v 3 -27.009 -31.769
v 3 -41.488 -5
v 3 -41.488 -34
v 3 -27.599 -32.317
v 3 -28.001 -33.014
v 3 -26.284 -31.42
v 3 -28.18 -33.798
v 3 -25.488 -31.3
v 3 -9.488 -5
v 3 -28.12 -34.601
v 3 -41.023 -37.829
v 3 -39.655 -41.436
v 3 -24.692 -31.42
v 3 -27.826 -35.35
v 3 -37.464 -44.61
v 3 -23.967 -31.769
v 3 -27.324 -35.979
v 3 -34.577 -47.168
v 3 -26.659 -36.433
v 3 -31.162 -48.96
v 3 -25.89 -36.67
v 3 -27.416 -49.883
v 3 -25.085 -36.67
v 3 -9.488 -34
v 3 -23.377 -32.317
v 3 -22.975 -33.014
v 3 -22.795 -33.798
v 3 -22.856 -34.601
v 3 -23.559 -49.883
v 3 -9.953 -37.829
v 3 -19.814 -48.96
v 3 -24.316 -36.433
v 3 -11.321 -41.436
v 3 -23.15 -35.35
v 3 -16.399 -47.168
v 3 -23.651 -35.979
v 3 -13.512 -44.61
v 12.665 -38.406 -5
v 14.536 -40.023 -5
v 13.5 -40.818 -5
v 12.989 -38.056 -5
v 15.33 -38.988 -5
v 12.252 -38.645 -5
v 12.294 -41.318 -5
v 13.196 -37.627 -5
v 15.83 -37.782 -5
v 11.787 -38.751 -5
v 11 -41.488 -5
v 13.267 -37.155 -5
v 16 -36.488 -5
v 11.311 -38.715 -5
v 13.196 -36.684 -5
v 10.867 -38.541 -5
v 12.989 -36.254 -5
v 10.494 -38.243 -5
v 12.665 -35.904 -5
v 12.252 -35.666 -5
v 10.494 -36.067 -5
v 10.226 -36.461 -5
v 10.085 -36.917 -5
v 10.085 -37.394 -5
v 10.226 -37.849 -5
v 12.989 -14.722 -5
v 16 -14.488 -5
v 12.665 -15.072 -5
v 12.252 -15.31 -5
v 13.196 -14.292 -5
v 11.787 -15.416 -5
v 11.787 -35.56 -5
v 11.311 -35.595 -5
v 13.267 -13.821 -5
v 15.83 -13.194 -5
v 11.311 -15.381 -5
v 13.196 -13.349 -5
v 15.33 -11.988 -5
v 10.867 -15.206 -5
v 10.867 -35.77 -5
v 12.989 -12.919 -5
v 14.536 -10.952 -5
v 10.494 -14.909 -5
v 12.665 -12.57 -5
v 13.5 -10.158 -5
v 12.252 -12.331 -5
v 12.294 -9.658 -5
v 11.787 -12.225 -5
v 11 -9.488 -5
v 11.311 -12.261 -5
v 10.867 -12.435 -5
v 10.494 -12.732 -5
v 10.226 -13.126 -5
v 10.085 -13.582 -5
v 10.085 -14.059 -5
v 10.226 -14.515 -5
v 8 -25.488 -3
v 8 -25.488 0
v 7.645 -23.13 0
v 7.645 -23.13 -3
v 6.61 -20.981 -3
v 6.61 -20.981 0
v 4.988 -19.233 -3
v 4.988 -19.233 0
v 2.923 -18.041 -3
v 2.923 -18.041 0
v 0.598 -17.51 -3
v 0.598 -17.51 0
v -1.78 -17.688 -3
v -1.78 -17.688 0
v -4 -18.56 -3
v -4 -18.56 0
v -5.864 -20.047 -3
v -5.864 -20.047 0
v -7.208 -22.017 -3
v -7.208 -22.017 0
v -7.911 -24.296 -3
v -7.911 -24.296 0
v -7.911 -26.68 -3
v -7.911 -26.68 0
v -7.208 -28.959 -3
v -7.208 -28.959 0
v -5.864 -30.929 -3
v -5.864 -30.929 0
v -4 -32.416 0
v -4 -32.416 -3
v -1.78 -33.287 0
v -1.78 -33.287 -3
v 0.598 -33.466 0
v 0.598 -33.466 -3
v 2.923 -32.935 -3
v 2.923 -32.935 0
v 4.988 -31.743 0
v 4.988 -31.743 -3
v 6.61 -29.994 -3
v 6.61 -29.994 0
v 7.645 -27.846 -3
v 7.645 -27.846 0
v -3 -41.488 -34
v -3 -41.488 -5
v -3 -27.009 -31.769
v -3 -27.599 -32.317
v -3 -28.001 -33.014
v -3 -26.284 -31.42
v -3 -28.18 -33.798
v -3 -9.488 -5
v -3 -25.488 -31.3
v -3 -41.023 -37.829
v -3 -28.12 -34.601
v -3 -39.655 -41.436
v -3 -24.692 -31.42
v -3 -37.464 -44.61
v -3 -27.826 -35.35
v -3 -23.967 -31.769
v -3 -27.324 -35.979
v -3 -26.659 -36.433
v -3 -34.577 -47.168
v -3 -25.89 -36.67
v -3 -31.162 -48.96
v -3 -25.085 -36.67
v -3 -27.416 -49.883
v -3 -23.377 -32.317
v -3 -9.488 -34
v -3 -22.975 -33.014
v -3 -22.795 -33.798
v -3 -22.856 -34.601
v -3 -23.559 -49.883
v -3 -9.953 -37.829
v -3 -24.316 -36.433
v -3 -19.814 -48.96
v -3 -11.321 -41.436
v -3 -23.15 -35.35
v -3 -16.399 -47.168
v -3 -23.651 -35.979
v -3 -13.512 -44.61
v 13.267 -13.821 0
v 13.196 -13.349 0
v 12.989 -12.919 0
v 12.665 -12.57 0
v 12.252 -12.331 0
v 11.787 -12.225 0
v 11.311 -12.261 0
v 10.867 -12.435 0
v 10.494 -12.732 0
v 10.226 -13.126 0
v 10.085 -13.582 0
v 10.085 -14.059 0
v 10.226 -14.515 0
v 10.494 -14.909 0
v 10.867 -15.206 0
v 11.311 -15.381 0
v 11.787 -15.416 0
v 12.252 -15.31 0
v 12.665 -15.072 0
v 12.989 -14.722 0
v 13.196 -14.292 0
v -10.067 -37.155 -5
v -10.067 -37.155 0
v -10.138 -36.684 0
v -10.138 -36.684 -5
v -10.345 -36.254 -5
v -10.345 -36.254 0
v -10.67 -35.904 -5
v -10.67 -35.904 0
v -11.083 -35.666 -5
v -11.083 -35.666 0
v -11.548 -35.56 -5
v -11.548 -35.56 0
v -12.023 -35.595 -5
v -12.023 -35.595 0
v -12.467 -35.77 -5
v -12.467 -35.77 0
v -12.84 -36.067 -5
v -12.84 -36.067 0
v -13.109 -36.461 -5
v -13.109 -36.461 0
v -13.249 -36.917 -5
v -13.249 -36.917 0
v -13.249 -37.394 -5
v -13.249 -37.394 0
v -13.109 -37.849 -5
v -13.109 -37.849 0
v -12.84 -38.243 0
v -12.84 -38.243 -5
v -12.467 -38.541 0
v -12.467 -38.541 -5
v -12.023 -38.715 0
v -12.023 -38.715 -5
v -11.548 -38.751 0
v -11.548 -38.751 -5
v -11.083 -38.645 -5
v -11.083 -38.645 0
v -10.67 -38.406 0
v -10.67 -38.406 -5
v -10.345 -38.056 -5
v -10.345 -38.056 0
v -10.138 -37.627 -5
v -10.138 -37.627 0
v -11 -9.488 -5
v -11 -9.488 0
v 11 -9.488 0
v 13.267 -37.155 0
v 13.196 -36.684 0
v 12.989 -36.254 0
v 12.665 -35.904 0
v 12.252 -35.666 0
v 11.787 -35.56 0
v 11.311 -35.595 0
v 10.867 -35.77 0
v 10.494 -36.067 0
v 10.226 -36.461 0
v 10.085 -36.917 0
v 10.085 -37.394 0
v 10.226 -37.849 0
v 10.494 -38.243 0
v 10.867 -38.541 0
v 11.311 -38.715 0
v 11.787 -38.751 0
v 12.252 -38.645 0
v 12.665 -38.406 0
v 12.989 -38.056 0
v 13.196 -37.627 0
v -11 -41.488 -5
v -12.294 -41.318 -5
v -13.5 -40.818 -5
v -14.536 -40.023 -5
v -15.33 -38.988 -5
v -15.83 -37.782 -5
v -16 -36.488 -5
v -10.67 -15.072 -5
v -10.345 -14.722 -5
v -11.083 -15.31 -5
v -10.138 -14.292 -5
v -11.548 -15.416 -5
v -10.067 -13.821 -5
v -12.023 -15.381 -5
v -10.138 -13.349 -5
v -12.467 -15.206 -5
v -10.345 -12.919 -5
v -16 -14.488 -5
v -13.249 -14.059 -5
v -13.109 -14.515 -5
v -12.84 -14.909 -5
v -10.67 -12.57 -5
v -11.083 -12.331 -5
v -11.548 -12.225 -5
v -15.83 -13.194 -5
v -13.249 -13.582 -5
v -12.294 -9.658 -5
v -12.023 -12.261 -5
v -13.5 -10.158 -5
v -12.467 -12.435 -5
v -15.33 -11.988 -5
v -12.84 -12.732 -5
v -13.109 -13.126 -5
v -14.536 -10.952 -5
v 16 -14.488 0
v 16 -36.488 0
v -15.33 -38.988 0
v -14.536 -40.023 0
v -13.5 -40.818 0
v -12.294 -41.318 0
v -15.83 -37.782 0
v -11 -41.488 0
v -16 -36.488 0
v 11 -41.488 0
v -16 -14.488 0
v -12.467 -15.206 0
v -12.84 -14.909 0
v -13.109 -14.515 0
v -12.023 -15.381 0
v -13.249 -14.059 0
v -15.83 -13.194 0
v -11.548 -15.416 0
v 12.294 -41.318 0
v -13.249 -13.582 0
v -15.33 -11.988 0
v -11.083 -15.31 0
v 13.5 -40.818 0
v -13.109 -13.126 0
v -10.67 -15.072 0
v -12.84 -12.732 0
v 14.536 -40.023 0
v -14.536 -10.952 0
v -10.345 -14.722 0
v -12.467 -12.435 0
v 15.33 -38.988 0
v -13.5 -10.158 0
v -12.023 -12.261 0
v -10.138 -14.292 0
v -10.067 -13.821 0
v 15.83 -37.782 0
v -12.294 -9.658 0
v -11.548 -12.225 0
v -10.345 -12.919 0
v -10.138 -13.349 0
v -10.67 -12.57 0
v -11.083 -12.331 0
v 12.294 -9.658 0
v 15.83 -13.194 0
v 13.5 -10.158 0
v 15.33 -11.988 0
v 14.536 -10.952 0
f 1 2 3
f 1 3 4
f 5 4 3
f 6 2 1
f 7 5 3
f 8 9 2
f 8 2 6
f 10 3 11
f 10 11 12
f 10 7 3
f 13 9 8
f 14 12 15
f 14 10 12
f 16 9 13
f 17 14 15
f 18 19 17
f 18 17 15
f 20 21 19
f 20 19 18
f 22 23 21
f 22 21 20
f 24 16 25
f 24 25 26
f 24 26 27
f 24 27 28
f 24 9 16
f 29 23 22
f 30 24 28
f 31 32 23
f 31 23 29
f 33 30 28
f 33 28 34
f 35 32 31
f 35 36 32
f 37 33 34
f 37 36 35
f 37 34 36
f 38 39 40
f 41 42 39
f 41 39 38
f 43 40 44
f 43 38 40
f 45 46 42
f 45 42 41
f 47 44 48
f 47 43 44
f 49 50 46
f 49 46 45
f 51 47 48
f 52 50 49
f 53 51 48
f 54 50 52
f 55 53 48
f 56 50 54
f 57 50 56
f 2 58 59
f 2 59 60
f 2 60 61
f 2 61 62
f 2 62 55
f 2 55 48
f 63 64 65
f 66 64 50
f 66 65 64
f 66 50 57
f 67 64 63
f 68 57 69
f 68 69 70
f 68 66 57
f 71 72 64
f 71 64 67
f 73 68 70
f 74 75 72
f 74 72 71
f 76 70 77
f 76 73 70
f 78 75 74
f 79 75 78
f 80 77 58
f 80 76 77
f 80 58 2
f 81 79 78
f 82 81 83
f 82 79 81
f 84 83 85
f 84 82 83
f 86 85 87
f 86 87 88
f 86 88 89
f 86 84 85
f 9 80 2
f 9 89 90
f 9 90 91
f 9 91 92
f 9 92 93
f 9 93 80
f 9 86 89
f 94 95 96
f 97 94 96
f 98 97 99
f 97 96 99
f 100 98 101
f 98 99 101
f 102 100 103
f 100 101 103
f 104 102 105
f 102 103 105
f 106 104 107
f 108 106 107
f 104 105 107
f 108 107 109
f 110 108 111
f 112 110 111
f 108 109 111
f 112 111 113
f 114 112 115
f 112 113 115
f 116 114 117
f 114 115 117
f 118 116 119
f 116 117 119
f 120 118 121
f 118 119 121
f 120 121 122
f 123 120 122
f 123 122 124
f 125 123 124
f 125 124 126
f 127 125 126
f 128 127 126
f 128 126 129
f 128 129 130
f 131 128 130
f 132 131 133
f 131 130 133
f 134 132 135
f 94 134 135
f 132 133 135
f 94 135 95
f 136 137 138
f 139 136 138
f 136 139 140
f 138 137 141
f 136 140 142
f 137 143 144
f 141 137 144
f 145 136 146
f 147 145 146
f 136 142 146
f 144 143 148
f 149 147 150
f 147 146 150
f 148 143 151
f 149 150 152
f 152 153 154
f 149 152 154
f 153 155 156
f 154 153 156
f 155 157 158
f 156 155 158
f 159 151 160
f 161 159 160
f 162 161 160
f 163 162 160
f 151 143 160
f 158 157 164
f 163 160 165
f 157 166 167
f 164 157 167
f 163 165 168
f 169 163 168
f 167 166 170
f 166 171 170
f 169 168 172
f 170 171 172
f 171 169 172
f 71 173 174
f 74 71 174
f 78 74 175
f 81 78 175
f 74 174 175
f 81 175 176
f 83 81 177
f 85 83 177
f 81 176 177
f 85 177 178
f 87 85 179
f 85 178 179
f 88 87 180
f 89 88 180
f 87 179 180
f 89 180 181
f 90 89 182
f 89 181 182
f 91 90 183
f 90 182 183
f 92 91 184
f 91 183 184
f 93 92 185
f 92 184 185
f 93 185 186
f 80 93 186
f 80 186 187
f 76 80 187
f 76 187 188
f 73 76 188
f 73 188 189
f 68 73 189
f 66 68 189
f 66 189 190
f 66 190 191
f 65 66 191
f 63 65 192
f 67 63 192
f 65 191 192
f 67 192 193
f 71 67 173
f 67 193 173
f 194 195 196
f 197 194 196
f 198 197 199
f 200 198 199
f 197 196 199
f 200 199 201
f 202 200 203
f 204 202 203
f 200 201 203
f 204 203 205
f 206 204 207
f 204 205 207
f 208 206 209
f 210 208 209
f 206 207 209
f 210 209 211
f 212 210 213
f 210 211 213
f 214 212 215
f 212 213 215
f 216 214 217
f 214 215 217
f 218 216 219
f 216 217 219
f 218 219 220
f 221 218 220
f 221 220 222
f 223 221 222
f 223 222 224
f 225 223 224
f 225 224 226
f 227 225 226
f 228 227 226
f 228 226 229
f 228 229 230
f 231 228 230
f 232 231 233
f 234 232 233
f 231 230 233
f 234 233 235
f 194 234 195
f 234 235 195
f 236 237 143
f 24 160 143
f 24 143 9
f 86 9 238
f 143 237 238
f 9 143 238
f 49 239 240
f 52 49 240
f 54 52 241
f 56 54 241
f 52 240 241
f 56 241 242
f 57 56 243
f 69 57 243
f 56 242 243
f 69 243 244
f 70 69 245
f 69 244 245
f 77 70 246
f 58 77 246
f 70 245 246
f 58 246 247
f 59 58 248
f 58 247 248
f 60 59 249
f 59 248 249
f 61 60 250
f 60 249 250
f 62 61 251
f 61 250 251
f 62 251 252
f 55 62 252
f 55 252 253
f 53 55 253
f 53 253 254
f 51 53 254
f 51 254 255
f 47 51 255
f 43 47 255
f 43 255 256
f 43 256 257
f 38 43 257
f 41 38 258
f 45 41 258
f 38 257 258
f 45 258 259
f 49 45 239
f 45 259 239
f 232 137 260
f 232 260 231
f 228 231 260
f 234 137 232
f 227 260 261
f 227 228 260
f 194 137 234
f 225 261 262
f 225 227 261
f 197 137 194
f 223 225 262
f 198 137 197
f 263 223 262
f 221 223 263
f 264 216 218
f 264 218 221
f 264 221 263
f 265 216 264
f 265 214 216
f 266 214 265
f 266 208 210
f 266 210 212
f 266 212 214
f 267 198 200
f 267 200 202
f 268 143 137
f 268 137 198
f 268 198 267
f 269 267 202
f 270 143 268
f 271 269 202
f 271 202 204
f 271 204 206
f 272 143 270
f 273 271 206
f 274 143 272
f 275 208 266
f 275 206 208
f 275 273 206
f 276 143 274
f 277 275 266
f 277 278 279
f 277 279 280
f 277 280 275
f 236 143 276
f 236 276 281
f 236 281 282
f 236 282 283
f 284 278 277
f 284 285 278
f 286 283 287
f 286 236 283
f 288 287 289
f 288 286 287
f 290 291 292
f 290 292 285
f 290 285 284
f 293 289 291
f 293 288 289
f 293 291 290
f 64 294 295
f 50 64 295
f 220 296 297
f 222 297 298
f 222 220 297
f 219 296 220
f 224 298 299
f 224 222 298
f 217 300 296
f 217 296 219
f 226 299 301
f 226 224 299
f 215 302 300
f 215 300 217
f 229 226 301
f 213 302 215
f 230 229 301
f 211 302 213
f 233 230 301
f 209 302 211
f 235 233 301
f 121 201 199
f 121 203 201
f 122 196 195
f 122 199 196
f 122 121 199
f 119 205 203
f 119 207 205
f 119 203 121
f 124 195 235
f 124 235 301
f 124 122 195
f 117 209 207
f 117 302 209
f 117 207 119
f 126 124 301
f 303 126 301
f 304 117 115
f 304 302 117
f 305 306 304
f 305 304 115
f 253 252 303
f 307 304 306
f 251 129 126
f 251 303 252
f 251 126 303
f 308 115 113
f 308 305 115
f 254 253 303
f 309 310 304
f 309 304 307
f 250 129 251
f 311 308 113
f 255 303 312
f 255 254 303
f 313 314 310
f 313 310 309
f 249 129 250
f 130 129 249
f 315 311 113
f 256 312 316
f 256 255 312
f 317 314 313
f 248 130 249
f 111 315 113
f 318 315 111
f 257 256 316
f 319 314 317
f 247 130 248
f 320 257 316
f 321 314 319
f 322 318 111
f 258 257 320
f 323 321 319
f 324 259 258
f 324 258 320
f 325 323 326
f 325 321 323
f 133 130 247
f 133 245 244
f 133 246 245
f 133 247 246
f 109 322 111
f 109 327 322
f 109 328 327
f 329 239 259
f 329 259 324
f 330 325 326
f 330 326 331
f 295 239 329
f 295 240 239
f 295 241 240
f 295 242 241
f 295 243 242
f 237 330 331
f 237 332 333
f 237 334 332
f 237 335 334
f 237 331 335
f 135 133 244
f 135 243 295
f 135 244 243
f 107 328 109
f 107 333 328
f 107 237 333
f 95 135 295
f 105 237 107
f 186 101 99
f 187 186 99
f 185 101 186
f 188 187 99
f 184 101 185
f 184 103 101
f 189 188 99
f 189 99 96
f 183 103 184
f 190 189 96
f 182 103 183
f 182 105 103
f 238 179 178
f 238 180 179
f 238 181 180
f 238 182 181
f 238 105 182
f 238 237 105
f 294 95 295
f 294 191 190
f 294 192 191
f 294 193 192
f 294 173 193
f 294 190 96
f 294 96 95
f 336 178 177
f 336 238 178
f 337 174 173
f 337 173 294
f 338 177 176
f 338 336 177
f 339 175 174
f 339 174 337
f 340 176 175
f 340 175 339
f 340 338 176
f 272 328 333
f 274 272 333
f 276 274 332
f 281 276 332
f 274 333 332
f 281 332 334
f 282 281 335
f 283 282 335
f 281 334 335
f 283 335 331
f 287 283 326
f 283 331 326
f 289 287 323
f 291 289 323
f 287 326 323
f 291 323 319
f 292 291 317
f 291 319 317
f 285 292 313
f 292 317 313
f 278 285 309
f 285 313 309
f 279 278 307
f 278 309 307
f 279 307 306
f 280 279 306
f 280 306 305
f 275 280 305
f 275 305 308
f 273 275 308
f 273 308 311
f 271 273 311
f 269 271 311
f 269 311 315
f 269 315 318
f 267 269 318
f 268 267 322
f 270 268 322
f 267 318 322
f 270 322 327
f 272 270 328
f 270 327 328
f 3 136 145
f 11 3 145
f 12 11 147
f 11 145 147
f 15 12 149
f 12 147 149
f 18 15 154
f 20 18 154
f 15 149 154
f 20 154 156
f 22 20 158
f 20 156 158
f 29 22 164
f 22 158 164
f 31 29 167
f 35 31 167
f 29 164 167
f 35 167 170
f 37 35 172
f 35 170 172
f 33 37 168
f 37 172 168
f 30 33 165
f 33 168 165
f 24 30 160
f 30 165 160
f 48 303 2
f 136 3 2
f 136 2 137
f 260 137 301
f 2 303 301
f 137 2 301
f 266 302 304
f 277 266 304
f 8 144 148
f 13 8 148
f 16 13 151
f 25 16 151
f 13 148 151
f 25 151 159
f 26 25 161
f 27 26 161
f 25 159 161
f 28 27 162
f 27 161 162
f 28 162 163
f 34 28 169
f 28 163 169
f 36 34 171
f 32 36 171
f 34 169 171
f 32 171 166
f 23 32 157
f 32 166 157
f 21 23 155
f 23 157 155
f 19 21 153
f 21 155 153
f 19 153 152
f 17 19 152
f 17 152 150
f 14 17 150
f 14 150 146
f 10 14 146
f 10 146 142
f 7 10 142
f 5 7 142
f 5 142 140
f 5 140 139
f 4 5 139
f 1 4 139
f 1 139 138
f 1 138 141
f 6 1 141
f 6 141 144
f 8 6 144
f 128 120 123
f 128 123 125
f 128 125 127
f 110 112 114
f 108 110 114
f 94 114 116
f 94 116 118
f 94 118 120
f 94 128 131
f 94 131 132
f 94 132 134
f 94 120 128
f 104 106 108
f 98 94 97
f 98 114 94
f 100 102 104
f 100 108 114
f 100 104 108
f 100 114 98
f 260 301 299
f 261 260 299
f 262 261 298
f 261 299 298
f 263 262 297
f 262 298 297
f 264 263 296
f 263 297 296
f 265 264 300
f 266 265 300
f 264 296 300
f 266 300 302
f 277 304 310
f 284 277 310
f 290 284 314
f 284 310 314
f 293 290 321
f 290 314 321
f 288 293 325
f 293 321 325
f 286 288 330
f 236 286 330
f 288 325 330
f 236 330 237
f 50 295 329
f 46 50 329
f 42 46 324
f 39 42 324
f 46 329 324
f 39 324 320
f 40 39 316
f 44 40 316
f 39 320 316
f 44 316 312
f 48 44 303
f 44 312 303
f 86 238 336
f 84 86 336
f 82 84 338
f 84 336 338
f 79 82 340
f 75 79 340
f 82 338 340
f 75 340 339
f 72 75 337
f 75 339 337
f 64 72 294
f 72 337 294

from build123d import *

# Parameters (mm, degrees)
SKETCH1_R           = 1.6
BOSS_EXTRUDE1_DEPTH = 5
SKETCH2_W           = 6
SKETCH2_H           = 50
BOSS_EXTRUDE2_DEPTH = 32
SKETCH3_R           = 2.7
CUT_EXTRUDE1_DEPTH  = 7
SKETCH4_R           = 8
CUT_EXTRUDE2_DEPTH  = 3
CUT_EXTRUDE3_DEPTH  = 68.692277038


with BuildPart() as part:
    # Sketch1 → Boss-Extrude1 (new body)
    with BuildSketch(Plane.XY):
        with BuildLine():
            Line((-11, -9.487882213), (11, -9.487882213))
            ThreePointArc((11, -9.487882213), (14.535533906, -10.952348307), (16, -14.487882213))
            Line((16, -14.487882213), (16, -36.487882213))
            ThreePointArc((16, -36.487882213), (14.535533906, -40.023416119), (11, -41.487882213))
            Line((11, -41.487882213), (-11, -41.487882213))
            ThreePointArc((-11, -41.487882213), (-14.535533906, -40.023416119), (-16, -36.487882213))
            Line((-16, -36.487882213), (-16, -14.487882213))
            ThreePointArc((-16, -14.487882213), (-14.535533906, -10.952348307), (-11, -9.487882213))
        make_face()
        with Locations((11.66726189, -13.820620324)):
            Circle(SKETCH1_R, mode=Mode.SUBTRACT)
        with Locations((11.66726189, -37.155144103)):
            Circle(SKETCH1_R, mode=Mode.SUBTRACT)
        with Locations((-11.66726189, -37.155144103)):
            Circle(SKETCH1_R, mode=Mode.SUBTRACT)
        with Locations((-11.66726189, -13.820620324)):
            Circle(SKETCH1_R, mode=Mode.SUBTRACT)
    extrude(amount=-BOSS_EXTRUDE1_DEPTH)

    # Sketch2 → Boss-Extrude2 (add)
    with BuildSketch(Plane(origin=(0, -9.487882213, 0), x_dir=(1, 0, 0), z_dir=(0, 1, 0))):
        with Locations((0, 25)):
            Rectangle(SKETCH2_W, SKETCH2_H)
    extrude(amount=-BOSS_EXTRUDE2_DEPTH)

    # Sketch3 → Cut-Extrude1 (cut)
    with BuildSketch(Plane.ZY.offset(3)):
        with Locations((-34, -25.487882213)):
            Circle(SKETCH3_R)
    extrude(amount=-CUT_EXTRUDE1_DEPTH, mode=Mode.SUBTRACT)

    # Sketch4 → Cut-Extrude2 (cut)
    with BuildSketch(Plane.XY):
        with Locations((0, -25.487882213)):
            Circle(SKETCH4_R)
    extrude(amount=-CUT_EXTRUDE2_DEPTH, mode=Mode.SUBTRACT)

    # Sketch7 → Cut-Extrude3 (cut, through all)
    with BuildSketch(Plane.ZY.offset(3)):
        with BuildLine():
            Line((-34, -9.487882213), (-52.373766184, -9.487882213))
            Line((-52.373766184, -9.487882213), (-52.373766184, -41.487882213))
            Line((-52.373766184, -41.487882213), (-34, -41.487882213))
            ThreePointArc((-34, -41.487882213), (-50, -25.487882213), (-34, -9.487882213))
        make_face()
    extrude(amount=-CUT_EXTRUDE3_DEPTH, mode=Mode.SUBTRACT)


solid = part.part
